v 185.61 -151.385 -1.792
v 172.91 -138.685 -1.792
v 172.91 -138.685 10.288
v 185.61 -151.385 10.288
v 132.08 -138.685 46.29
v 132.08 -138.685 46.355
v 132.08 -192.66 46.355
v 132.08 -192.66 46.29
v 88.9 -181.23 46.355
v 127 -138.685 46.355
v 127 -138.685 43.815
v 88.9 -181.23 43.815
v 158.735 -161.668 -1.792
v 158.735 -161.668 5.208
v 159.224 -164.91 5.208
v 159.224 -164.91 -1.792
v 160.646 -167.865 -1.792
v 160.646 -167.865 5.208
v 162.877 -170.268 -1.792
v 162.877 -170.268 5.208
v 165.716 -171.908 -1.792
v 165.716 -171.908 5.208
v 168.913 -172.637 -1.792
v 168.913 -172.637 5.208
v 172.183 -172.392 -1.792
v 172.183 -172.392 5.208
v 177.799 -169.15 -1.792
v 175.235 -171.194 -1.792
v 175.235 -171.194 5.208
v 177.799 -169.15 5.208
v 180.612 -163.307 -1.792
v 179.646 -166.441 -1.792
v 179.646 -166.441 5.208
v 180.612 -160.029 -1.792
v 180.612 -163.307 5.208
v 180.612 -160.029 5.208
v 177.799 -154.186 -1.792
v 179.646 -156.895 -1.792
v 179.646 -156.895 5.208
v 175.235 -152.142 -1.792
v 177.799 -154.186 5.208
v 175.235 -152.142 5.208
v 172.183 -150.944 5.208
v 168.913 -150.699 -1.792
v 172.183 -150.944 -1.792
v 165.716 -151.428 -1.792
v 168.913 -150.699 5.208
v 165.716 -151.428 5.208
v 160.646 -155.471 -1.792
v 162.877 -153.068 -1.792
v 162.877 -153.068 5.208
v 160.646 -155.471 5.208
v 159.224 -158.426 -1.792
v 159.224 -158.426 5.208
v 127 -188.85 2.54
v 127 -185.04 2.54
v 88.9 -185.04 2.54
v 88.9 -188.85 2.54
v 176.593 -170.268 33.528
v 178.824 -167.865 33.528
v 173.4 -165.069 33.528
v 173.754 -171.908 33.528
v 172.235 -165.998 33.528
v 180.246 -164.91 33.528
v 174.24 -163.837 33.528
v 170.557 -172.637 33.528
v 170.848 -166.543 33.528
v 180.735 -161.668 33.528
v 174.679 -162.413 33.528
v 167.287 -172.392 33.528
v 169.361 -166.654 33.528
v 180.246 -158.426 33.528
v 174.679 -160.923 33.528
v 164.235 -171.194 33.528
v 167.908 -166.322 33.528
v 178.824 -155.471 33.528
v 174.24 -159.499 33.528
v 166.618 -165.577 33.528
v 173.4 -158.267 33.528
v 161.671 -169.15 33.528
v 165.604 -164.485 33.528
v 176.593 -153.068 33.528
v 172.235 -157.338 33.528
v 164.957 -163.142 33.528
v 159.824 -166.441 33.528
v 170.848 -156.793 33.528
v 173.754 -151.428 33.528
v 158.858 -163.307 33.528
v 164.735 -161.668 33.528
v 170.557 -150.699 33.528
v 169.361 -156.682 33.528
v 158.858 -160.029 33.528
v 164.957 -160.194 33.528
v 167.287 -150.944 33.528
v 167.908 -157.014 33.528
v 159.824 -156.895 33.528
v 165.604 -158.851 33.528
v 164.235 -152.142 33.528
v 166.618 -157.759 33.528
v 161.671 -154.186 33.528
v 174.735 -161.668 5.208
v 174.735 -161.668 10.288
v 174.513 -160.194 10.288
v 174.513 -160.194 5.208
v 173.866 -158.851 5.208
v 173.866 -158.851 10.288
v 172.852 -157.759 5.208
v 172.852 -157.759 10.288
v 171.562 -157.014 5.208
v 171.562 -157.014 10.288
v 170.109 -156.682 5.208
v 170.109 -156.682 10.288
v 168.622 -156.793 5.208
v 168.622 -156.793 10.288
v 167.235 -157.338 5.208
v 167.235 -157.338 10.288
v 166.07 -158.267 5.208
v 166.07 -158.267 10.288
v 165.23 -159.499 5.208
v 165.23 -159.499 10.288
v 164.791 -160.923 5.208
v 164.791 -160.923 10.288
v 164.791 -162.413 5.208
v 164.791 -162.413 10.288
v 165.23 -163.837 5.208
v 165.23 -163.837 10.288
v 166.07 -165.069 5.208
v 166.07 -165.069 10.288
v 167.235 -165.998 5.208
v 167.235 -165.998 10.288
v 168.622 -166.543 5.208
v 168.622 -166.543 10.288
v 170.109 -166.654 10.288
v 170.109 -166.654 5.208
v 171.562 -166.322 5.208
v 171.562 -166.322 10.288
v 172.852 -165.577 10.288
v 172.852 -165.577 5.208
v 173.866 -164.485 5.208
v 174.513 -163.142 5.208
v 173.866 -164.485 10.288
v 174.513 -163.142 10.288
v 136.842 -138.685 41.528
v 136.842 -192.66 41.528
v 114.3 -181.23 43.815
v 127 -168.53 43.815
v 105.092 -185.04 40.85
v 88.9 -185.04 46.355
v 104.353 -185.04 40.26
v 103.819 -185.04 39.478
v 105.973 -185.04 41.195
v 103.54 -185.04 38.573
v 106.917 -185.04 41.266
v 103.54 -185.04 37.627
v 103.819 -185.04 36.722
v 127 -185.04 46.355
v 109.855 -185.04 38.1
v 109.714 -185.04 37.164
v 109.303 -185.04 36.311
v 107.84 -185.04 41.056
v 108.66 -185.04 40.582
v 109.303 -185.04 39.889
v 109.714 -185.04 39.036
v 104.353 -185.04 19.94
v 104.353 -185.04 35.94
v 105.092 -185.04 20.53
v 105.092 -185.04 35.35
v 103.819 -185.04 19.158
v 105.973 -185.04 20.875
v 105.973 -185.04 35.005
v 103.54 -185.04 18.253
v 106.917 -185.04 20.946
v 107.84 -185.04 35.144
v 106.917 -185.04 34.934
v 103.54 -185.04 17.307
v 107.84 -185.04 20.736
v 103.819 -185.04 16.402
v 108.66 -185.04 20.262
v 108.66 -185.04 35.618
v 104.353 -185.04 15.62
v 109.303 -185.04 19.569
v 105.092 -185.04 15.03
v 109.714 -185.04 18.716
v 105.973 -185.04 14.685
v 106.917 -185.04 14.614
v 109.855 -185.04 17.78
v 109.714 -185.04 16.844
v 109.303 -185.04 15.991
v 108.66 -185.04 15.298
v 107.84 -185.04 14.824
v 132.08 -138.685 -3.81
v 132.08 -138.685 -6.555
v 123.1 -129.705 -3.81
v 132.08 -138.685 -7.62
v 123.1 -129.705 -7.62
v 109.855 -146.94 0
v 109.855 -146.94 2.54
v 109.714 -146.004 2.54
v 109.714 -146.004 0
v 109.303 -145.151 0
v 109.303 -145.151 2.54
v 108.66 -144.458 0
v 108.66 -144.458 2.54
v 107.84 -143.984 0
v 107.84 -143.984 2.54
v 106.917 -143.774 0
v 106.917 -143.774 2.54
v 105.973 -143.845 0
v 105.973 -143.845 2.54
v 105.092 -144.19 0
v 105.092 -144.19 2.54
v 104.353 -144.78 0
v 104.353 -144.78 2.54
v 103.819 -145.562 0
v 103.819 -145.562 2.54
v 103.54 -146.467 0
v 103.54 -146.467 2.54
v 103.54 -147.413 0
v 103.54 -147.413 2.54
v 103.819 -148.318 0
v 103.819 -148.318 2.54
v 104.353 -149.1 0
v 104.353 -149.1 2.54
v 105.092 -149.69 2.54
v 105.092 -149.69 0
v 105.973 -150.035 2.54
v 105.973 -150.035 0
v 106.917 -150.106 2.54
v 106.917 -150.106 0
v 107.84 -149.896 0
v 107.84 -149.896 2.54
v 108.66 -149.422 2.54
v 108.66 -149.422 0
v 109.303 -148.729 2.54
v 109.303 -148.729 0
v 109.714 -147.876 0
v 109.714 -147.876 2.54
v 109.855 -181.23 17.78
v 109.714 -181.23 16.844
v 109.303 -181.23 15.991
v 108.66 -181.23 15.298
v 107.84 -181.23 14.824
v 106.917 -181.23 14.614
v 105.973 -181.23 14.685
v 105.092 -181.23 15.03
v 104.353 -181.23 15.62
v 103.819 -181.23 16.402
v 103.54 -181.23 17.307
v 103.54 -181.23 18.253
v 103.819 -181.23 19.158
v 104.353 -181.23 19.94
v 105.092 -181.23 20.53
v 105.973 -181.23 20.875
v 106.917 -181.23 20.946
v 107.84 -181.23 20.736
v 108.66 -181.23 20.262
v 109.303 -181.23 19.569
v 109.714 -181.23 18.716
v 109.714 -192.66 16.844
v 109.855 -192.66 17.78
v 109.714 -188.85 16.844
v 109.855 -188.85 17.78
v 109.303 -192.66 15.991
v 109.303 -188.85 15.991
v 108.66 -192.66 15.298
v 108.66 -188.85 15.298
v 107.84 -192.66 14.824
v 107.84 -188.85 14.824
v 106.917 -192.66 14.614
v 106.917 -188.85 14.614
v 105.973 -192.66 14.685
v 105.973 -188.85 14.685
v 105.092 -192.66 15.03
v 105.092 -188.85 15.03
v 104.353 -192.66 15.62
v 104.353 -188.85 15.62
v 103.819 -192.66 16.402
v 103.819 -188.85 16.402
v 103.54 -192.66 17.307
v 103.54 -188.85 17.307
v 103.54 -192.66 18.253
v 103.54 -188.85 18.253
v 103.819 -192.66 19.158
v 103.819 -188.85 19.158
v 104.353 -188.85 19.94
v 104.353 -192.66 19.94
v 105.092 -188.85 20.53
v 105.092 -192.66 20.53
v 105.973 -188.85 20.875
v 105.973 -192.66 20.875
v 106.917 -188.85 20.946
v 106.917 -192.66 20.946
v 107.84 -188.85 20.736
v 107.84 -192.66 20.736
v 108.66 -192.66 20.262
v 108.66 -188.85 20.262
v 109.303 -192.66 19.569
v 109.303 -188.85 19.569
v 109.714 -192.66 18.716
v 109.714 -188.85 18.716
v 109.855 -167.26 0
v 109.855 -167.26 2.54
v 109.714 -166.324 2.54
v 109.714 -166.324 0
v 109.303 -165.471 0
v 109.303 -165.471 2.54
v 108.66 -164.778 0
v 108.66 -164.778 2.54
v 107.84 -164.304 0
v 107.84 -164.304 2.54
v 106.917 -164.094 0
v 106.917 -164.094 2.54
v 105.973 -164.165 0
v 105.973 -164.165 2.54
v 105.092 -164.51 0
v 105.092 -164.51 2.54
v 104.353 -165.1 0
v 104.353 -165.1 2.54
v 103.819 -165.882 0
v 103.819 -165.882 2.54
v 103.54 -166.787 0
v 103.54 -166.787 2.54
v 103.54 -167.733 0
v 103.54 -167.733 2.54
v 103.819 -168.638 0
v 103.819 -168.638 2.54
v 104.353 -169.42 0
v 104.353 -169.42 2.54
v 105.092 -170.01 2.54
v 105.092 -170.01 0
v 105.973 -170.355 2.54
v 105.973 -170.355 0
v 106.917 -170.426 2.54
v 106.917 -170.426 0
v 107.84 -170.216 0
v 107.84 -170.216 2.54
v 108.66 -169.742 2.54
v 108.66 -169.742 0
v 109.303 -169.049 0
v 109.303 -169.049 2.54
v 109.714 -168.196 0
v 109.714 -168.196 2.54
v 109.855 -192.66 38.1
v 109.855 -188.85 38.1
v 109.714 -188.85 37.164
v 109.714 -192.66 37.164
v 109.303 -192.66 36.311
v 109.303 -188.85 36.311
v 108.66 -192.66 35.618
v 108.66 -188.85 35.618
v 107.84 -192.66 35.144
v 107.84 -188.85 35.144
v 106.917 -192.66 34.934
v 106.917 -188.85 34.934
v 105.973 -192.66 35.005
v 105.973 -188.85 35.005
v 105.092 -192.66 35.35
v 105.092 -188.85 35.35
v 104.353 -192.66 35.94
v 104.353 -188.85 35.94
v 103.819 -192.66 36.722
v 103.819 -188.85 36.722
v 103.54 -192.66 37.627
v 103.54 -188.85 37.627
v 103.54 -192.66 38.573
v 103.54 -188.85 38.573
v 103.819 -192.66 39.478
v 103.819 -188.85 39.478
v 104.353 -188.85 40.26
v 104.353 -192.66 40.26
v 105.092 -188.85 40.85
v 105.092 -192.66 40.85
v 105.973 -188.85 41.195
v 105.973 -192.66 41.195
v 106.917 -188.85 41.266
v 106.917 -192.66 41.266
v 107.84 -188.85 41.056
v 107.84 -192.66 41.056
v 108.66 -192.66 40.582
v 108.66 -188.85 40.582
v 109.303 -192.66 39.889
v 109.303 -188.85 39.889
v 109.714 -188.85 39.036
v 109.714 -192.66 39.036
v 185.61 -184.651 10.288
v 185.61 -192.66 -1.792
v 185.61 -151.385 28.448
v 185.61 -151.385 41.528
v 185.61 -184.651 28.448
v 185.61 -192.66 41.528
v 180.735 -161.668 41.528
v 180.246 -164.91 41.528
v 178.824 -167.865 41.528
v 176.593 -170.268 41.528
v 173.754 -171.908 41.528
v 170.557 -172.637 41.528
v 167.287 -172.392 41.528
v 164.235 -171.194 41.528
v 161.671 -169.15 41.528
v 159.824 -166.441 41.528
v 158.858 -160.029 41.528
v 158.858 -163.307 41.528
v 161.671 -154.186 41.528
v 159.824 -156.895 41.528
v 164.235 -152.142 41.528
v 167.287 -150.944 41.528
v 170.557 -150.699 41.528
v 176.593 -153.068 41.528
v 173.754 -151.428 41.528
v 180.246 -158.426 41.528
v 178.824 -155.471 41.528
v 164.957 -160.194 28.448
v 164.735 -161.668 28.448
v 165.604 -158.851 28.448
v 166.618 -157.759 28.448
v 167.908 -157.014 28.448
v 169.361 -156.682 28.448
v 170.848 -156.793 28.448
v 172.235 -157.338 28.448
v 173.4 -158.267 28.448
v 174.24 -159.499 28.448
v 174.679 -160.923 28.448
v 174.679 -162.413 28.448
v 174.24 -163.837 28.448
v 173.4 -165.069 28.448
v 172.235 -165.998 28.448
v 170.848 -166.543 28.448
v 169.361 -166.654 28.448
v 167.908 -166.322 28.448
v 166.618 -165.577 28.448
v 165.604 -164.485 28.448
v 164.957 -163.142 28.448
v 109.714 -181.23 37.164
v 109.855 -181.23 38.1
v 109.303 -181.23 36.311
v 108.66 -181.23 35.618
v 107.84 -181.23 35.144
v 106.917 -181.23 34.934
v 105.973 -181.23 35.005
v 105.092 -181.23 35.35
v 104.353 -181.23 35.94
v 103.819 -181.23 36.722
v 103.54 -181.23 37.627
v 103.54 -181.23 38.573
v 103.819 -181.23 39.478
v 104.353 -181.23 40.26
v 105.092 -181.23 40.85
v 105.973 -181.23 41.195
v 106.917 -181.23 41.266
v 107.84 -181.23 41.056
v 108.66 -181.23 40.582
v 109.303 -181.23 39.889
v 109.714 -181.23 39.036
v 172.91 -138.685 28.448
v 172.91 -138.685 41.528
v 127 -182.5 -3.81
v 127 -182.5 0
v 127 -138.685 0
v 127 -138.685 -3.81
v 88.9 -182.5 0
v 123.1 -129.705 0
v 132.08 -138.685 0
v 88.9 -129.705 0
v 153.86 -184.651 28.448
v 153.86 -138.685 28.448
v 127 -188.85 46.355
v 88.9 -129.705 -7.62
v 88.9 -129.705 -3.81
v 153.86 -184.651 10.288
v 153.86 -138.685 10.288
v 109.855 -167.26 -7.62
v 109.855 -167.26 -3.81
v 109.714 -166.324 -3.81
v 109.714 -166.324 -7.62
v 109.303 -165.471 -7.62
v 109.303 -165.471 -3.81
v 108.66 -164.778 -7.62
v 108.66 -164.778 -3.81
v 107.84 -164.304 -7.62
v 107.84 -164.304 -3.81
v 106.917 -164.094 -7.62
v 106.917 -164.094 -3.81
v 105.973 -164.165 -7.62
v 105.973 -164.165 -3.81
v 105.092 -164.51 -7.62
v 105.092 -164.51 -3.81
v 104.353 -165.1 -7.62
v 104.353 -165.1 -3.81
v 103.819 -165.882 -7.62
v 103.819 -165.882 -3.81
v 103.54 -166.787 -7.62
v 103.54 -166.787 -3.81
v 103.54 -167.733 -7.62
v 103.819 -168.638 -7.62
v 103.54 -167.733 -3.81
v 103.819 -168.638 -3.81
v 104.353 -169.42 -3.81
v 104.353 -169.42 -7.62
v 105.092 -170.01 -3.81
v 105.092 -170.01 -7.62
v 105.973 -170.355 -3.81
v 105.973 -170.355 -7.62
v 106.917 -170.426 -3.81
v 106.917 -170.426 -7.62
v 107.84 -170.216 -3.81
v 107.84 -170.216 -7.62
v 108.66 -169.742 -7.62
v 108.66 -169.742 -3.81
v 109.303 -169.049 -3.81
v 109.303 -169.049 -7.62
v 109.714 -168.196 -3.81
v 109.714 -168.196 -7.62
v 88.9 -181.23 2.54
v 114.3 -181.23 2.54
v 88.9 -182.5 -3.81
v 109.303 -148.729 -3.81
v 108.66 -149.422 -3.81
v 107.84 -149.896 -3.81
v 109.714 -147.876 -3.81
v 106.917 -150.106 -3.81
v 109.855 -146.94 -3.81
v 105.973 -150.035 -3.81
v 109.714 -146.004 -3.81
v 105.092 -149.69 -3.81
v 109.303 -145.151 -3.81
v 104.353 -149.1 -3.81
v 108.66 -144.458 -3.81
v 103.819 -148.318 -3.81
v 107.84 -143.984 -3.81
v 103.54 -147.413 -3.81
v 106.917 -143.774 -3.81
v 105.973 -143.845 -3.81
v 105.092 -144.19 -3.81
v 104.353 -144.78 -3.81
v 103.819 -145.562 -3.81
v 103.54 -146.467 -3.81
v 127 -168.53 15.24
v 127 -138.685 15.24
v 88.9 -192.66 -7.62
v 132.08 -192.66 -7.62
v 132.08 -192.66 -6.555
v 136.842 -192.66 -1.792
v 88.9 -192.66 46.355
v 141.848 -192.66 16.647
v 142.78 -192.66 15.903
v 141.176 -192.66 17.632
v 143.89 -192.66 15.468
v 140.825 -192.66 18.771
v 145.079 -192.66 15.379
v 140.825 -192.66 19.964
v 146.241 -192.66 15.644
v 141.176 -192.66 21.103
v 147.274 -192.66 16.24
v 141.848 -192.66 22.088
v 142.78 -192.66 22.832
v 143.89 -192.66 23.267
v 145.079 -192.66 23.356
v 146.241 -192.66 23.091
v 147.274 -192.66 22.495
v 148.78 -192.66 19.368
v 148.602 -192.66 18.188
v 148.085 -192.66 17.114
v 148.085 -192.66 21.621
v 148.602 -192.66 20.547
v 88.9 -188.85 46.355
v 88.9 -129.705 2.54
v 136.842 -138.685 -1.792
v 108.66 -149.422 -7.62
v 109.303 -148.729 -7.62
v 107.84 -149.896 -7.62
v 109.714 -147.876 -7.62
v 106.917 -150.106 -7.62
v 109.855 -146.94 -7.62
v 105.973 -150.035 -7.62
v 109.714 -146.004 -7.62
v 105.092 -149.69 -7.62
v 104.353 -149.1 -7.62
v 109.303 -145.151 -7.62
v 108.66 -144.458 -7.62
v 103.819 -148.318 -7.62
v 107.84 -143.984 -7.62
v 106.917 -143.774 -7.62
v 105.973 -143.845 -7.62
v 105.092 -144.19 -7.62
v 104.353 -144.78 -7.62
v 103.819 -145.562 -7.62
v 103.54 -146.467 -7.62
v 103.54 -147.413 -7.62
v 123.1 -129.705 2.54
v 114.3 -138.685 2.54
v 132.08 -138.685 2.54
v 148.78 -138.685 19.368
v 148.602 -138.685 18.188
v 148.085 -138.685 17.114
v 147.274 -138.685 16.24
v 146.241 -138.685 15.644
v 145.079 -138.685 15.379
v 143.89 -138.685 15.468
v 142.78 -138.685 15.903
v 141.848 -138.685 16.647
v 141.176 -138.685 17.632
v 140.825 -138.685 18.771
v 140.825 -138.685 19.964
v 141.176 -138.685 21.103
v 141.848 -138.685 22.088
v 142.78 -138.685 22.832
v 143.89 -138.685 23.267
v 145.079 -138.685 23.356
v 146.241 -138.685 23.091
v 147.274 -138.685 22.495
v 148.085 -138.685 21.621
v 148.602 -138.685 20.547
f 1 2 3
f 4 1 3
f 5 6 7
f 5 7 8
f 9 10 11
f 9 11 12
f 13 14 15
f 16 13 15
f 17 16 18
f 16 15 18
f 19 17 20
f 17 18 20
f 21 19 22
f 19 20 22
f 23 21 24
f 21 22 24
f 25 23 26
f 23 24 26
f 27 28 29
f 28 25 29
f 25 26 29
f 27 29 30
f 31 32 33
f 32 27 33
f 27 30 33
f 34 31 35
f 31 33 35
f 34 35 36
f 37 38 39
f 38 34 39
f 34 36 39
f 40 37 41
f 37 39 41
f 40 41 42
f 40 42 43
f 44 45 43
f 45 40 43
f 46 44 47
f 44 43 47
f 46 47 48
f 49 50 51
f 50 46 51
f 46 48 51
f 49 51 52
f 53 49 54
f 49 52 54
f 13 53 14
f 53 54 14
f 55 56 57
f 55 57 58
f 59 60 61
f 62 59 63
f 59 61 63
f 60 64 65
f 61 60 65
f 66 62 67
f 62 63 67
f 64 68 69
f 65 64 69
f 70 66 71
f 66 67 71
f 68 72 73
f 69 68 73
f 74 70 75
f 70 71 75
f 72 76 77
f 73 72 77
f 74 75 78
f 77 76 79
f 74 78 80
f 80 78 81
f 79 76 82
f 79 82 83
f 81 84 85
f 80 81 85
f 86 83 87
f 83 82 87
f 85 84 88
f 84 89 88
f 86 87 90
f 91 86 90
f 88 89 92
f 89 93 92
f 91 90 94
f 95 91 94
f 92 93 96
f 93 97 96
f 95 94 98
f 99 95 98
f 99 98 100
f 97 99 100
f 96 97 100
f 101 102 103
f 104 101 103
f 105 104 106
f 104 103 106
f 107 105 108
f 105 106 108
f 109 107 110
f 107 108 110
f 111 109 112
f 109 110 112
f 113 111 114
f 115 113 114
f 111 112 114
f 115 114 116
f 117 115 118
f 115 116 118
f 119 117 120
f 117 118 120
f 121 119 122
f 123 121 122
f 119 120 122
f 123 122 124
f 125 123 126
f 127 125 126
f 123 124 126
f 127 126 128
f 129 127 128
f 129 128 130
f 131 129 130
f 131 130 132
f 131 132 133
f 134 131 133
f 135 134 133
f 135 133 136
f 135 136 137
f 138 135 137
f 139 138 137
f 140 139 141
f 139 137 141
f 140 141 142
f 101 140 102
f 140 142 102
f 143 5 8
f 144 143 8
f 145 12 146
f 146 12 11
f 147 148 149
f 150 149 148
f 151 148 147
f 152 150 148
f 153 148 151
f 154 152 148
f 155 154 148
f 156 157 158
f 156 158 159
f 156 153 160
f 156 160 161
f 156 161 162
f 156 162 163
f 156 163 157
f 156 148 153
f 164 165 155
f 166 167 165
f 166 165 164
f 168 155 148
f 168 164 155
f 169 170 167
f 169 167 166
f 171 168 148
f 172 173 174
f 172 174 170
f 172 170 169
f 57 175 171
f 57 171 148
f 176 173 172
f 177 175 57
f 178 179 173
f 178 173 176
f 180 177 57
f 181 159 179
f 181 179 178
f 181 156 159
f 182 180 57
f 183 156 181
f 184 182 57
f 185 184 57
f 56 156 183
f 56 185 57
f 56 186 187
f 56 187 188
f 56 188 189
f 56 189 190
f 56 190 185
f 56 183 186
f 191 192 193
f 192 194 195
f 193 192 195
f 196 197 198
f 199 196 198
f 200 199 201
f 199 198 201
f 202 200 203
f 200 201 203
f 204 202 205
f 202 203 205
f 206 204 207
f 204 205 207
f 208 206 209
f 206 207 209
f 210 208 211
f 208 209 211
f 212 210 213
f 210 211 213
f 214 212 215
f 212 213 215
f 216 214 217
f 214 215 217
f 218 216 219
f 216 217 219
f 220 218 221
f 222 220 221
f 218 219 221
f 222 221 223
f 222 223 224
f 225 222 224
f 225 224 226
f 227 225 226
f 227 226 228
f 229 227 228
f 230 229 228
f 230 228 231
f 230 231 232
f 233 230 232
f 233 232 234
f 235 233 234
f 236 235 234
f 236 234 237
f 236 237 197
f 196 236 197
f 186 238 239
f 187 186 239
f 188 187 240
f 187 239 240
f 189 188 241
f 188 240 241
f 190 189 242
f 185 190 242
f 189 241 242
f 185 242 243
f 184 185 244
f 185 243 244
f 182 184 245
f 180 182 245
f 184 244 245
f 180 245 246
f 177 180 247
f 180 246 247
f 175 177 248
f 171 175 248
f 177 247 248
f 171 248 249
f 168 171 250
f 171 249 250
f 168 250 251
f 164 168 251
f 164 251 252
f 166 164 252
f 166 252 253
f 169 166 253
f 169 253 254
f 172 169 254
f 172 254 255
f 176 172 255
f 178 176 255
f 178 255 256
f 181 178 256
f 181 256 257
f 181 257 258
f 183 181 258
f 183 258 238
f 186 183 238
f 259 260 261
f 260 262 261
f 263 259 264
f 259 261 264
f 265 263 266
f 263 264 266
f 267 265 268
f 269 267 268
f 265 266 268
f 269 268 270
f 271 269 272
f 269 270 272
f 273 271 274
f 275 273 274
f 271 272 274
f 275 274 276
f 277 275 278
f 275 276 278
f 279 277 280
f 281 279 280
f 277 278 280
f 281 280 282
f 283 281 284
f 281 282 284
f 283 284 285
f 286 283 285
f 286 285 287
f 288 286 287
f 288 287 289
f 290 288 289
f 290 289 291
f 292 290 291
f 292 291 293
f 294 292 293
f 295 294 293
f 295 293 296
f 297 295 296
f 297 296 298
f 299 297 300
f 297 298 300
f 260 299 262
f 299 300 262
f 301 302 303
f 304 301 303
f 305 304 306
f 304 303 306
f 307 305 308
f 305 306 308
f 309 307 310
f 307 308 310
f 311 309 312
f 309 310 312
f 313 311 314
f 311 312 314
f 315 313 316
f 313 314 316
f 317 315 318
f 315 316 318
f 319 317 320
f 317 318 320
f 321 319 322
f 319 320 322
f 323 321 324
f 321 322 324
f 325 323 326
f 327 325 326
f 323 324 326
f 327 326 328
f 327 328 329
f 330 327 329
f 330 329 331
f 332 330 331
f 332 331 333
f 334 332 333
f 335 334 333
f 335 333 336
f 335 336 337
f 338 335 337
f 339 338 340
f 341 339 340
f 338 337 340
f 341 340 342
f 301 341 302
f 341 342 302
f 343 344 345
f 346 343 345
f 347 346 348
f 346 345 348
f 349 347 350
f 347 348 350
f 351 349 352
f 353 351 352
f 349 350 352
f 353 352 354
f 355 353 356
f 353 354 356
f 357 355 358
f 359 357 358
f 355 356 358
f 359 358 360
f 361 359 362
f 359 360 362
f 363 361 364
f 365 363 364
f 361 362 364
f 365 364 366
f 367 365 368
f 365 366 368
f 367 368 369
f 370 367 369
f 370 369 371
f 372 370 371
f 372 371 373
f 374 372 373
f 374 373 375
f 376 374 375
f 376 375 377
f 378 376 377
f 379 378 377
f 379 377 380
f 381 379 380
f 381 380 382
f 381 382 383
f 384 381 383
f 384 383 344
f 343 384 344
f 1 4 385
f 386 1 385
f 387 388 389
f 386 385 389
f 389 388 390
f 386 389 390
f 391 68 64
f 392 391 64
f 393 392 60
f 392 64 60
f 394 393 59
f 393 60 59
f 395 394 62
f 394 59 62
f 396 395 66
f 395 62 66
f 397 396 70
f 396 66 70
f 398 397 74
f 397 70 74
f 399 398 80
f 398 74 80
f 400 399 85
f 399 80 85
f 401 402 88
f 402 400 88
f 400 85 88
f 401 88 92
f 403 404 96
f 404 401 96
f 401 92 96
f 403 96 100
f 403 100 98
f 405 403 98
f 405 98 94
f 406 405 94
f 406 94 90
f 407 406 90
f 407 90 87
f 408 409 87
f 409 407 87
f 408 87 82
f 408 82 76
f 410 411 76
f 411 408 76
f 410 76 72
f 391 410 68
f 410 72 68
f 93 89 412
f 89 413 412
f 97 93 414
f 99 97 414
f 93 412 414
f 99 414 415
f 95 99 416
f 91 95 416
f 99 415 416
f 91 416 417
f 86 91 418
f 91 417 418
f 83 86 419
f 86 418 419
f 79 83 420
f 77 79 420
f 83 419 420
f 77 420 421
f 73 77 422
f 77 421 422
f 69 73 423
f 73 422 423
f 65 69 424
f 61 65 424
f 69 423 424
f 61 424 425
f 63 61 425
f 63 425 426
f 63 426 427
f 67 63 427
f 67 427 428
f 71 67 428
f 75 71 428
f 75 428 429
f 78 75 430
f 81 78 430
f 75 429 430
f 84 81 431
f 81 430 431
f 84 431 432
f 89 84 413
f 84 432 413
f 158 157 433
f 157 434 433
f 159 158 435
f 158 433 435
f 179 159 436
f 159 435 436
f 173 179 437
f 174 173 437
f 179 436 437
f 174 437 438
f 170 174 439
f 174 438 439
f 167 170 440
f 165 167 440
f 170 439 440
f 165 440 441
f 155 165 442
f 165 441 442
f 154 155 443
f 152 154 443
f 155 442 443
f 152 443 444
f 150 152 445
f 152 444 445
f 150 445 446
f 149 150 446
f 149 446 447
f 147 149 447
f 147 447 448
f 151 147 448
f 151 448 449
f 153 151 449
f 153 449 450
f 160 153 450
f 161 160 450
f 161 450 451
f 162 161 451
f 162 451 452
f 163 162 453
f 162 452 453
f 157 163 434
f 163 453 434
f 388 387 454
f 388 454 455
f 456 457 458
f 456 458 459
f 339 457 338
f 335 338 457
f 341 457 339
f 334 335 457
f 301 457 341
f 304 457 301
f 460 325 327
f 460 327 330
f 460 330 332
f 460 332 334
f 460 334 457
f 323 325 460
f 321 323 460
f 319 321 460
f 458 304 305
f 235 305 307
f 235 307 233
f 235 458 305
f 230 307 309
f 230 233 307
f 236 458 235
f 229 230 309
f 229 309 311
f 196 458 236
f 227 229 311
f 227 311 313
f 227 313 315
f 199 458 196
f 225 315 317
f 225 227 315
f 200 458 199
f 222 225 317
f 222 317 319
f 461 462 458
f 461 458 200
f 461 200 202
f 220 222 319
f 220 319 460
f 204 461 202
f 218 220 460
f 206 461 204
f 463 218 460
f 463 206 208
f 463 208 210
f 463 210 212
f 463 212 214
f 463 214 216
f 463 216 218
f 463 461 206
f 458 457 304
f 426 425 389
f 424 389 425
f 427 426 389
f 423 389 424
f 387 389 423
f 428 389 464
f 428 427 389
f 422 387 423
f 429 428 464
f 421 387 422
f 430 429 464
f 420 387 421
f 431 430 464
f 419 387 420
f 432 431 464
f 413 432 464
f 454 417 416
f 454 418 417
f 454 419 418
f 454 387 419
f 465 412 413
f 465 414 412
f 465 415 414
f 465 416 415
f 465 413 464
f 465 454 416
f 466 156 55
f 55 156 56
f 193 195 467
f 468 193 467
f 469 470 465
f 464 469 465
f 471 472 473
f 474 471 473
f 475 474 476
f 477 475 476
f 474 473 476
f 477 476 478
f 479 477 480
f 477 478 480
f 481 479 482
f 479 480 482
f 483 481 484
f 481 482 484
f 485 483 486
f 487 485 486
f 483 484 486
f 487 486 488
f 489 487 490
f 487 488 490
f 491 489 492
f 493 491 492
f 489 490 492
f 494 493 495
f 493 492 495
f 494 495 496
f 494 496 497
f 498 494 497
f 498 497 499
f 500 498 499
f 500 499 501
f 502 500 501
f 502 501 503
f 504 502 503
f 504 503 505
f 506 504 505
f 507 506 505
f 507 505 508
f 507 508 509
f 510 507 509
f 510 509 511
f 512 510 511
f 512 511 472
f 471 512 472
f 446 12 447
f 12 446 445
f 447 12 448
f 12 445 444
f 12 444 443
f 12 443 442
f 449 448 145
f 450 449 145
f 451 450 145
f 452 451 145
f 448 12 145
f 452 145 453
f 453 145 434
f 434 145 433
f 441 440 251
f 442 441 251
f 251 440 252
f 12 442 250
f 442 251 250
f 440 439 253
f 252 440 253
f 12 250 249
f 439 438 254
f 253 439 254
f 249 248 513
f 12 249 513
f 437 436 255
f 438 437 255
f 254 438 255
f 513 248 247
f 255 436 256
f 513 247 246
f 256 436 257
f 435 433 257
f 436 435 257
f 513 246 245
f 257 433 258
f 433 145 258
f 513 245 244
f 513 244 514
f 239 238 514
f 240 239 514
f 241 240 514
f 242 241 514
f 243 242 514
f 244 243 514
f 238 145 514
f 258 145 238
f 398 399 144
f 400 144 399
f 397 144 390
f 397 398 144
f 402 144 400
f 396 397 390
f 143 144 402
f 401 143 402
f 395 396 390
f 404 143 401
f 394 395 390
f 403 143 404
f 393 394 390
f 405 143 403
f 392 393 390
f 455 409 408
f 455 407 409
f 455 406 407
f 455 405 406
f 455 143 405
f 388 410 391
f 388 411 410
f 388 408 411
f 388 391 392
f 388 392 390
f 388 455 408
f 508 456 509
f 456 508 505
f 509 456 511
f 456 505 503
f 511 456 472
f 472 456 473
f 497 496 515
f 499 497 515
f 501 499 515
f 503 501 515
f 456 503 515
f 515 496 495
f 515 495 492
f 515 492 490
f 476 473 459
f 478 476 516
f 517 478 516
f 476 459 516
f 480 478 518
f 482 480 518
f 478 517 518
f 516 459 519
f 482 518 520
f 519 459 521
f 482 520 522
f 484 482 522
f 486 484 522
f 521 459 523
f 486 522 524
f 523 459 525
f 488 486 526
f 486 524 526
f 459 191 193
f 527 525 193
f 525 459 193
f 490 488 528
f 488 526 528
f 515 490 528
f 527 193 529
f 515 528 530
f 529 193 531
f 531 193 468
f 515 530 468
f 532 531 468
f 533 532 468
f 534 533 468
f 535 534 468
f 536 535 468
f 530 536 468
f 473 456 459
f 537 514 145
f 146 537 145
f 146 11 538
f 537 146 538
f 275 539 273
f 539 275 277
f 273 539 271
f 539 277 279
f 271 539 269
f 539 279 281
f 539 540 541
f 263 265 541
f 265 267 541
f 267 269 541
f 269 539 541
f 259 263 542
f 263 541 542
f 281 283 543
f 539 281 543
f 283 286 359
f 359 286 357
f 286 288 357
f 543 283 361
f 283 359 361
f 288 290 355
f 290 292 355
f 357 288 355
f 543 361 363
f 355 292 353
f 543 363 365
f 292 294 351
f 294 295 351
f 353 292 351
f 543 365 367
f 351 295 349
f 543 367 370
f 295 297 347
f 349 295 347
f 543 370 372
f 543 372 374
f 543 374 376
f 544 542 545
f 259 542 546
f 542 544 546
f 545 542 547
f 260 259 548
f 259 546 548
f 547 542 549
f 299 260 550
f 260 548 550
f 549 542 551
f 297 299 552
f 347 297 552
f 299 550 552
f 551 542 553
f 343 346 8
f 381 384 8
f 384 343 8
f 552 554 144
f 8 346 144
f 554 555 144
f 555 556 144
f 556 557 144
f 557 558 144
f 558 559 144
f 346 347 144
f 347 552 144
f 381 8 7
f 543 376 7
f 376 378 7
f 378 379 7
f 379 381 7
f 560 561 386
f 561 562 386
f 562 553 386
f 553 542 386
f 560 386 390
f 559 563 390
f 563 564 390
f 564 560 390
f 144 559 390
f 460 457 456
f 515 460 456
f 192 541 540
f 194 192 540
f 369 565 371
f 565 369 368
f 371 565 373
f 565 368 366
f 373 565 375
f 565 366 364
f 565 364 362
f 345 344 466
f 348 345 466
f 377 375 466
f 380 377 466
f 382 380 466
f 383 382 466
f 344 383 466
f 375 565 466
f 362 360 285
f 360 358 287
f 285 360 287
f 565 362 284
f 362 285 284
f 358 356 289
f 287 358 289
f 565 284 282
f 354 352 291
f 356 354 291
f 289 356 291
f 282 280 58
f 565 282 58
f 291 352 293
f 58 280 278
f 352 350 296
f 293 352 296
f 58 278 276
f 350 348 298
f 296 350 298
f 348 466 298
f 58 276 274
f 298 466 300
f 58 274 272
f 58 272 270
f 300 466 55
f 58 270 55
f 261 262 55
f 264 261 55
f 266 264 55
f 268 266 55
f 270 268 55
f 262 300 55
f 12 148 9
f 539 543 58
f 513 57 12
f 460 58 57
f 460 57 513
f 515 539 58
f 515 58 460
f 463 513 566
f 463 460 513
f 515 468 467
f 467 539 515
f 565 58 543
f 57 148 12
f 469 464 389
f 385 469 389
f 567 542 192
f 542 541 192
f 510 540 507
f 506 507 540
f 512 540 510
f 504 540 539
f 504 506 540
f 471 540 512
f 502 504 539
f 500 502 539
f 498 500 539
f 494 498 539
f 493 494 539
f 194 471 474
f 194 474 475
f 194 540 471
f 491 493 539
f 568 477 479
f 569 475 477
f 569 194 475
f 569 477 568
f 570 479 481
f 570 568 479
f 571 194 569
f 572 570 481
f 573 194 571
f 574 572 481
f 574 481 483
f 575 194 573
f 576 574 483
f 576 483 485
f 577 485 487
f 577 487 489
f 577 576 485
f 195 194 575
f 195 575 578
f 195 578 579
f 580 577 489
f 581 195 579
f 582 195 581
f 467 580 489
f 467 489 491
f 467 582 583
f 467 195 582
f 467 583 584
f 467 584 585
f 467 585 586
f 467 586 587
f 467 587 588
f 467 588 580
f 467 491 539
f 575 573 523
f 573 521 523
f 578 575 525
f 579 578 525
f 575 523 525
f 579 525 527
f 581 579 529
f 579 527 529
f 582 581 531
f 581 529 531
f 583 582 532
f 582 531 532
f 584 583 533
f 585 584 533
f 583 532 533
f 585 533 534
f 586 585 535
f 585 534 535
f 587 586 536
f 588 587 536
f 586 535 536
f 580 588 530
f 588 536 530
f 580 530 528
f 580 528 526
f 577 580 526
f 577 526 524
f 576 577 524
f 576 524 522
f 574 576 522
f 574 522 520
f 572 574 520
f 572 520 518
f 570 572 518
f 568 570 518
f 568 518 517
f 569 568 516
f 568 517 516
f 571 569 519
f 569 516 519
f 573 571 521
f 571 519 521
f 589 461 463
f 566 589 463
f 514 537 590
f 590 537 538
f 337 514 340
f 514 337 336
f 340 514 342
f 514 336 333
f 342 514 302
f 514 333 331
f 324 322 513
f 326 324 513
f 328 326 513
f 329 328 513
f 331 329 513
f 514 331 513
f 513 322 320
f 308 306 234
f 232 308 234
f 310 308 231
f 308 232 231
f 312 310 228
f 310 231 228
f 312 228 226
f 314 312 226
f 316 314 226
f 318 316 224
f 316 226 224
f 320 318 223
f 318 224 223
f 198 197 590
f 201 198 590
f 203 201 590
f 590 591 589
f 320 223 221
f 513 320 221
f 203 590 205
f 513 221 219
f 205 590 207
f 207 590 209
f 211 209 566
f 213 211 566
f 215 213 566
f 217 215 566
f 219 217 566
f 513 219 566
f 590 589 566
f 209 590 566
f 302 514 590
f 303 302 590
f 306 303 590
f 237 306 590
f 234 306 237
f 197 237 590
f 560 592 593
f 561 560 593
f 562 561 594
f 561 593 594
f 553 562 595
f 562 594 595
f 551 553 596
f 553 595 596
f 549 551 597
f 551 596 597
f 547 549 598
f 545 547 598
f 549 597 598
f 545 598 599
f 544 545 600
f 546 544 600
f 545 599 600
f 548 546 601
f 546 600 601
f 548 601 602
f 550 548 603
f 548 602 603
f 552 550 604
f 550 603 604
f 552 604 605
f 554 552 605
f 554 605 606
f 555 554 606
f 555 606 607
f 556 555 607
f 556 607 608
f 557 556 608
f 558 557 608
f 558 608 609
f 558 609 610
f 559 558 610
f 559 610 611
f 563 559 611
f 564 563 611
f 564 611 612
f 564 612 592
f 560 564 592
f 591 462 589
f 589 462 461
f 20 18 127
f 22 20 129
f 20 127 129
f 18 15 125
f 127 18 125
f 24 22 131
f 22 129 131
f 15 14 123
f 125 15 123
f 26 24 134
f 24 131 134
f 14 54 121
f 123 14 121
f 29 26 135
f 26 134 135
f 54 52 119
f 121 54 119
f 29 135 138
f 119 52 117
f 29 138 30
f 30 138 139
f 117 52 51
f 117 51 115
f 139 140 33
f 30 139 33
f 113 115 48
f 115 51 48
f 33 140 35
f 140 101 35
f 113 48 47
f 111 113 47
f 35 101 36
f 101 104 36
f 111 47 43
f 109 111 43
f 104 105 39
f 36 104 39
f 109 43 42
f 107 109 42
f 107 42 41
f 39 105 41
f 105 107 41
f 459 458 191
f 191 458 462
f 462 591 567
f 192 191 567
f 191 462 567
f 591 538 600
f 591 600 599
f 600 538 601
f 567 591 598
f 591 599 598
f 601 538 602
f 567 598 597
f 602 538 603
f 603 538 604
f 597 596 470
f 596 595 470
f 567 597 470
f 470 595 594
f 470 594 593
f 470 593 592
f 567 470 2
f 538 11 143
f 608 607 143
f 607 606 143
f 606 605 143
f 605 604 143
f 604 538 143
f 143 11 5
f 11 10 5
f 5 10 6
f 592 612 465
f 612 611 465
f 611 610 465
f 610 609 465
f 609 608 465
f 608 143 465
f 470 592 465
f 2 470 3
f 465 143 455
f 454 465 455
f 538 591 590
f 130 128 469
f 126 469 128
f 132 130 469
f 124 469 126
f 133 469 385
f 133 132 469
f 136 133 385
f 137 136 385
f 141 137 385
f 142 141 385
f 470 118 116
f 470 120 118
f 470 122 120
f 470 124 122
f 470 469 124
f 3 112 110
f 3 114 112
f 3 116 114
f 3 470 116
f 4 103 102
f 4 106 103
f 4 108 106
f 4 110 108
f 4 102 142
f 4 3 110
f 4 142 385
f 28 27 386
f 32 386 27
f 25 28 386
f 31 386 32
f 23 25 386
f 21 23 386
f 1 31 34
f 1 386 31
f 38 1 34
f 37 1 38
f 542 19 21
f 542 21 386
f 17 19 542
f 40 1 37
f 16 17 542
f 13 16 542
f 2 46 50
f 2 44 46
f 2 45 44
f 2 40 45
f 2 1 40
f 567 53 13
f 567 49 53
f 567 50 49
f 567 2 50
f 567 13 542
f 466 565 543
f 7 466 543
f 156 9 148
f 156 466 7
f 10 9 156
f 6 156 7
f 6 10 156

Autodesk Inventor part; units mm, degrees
ref_plane "YZ Plane" through (0, 0, 0) normal (1, 0, 0) x (0, 1, 0)
ref_plane "XZ Plane" through (0, 0, 0) normal (0, 1, 0) x (-1, 0, 0)
ref_plane "Work Plane1" through (0, 0, 0) normal (0, 0, 1) x (1, 0, 0)
ref_plane "Work Plane2" through (127, 182.5, 0) normal (1, 0, 0) x (0, 1, 0)
sketch "Sketch1" plane through (127, 182.5, 0) normal (1, 0, 0) x (0, 1, 0)
  line L0 (0, -3.81) -> (-365, -3.81) projected
  line L1 (0, 0) -> (0, -3.81) projected
  line L2 (0, 0) -> (-365, 0) projected
  line L3 (-365, 0) -> (-365, -3.81) projected
  line L4 (-371.35, 459.74) -> (-371.35, 2.54) projected
  line L5 (-367.54, 2.54) -> (-371.35, 2.54) projected
  line L6 (-367.54, 459.74) -> (-367.54, 2.54) projected
  line L7 (-367.54, 459.74) -> (-371.35, 459.74) projected
  line L8 (-367.54, 46.355) -> (-363.73, 46.355)
  line L9 (-321.185, -3.81) -> (-321.185, -7.62)
  line L10 (-321.185, -7.62) -> (-375.16, -7.62)
  line L11 (-375.16, -7.62) -> (-375.16, 46.355)
  line L12 (-363.73, 46.355) -> (-363.73, 2.54)
  line L13 (-363.73, 2.54) -> (-321.185, 2.54)
  line L14 (-321.185, 2.54) -> (-321.185, 0)
  line L15 (-321.185, 0) -> (-365, 0)
  line L16 (-365, 0) -> (-365, -3.81)
  line L17 (-365, -3.81) -> (-321.185, -3.81)
  line L18 (-371.35, 46.355) -> (-371.35, 41.275)
  line L19 (-371.35, 41.275) -> (-371.35, 2.54)
  line L20 (-371.35, 2.54) -> (-367.54, 2.54)
  line L21 (-367.54, 2.54) -> (-367.54, 46.355)
  line L22 (-375.16, 46.355) -> (-371.35, 46.355)
  line L23 (-367.54, 46.355) -> (-363.73, 46.355)
  point P0 (-182.5, 0)
  point P1 (-326.265, 0)
  point P2 (-326.265, -3.81)
  point P3 (-367.54, 41.275)
  dimension "d2" = 3.81
  dimension "d4" = 3.81
extrude "Extrusion1" add sketch "Sketch1" against normal blind 38.1 contours L9 L10 L11 L22 L4 L5 L6 L8 L12 L13 L14 L2 L3 L0
sketch "Sketch2" plane through (127, 182.5, 0) normal (1, 0, 0) x (0, 0, -1)
  line L0 (3.81, -365) -> (0, -365) projected
  line L1 (0, -365) -> (0, -321.185) projected
  line L2 (0, -321.185) -> (-2.54, -321.185) projected
  line L3 (-2.54, -321.185) -> (-2.54, -363.73) projected
  line L4 (-2.54, -363.73) -> (-46.355, -363.73) projected
  line L5 (-46.355, -363.73) -> (-46.355, -367.54) projected
  line L6 (-46.355, -367.54) -> (-2.54, -367.54) projected
  line L7 (-2.54, -367.54) -> (-2.54, -371.35) projected
  line L8 (-2.54, -371.35) -> (-46.355, -371.35) projected
  line L9 (-46.355, -371.35) -> (-46.355, -375.16) projected
  line L10 (-46.355, -375.16) -> (7.62, -375.16) projected
  line L11 (7.62, -375.16) -> (7.62, -321.185) projected
  line L12 (7.62, -321.185) -> (3.81, -321.185) projected
  line L13 (3.81, -321.185) -> (3.81, -365) projected
  line L14 (3.81, -321.185) -> (7.62, -321.185) projected
  line L15 (7.62, -375.16) -> (-46.355, -375.16) projected
  line L16 (7.62, -321.185) -> (-46.355, -321.185)
  line L17 (-46.355, -321.185) -> (-46.355, -375.16)
  line L18 (-46.355, -375.16) -> (7.62, -375.16)
  line L19 (7.62, -375.16) -> (7.62, -321.185)
  point P0 (0, -182.5)
extrude "Extrusion2" add sketch "Sketch2" along normal blind 5.08
sketch "Sketch3" plane through (88.9, -138.685, -3.81) normal (0, 1, 0) x (1, 0, 0)
  line L0 (38.1, -3.81) -> (0, -3.81) projected
  line L1 (0, -6.35) -> (0, -3.81) projected
  line L2 (38.1, -6.35) -> (0, -6.35) projected
  line L3 (38.1, -6.35) -> (38.1, -50.165) projected
  line L4 (38.1, -50.165) -> (43.18, -50.165) projected
  line L5 (43.18, 3.81) -> (43.18, -50.165) projected
  line L6 (0, 3.81) -> (43.18, 3.81) projected
  line L7 (0, 0) -> (0, 3.81) projected
  line L8 (38.1, 0) -> (0, 0) projected
  line L9 (38.1, 0) -> (38.1, -3.81) projected
  line L10 (43.18, -50.165) -> (43.18, 3.81) projected
  line L11 (43.18, -23.1775) -> (55.88, -23.1775)
  circle A0 centre (55.88, -23.1775) radius 4
  line L12 (55.88, -27.1775) -> (55.88, -32.2575)
  line L13 (55.88, -19.1775) -> (55.88, -14.0975)
  line L14 (59.88, -23.1775) -> (64.96, -23.1775)
  line L15 (43.18, -14.0975) -> (64.96, -14.0975)
  line L16 (64.96, -14.0975) -> (64.96, -32.2575)
  line L17 (64.96, -32.2575) -> (43.18, -32.2575)
  line L18 (43.18, -32.2575) -> (43.18, -14.0975)
  point P0 (-88.9, -3.81)
  dimension "d9" = 12.7
  dimension "d10" = 8
  dimension "d11" = 5.08
  dimension "d12" = 5.08
  dimension "d13" = 5.08
extrude "Extrusion3" add sketch "Sketch3" against normal up to surface (53.975 mm away) contours L15 L13 A0 L11 L5 | L5 L11 A0 L12 L17 | L15 L16 L14 A0 L13 | L12 A0 L14 L16 L17
sketch "Sketch4" plane through (132.08, -138.685, 28.4475) normal (0, 0, 1) x (1, 0, 0)
  line L0 (0, -53.975) -> (21.78, -53.975) projected
  line L1 (21.78, 0) -> (21.78, -53.975) projected
  line L2 (0, 0) -> (21.78, 0) projected
  line L3 (0, -53.975) -> (0, 0) projected
  line L4 (0, -53.975) -> (0, 0) projected
  line L5 (21.78, 0) -> (21.78, -53.975) projected
  line L6 (0, -45.966) -> (21.78, -45.966)
  line L7 (21.78, -45.966) -> (21.78, -26.916)
  line L8 (21.78, -26.916) -> (0, -26.916)
  line L9 (0, -26.916) -> (0, -45.966)
  line L10 (21.78, -45.966) -> (53.53, -45.966)
  line L11 (53.53, -45.966) -> (53.53, 0)
  line L12 (53.53, 0) -> (21.78, 0)
  line L13 (21.78, 0) -> (21.78, -45.966)
  circle A0 centre (37.655, -22.983) radius 11
  point P0 (-132.08, 138.685)
  dimension "d16" = 19.05
  dimension "d17" = 31.75
  dimension "d18" = 22
extrude "Extrusion4" add sketch "Sketch4" along normal blind 5.08 contours L3 L8 L1 L6 | L1 L12 L11 L10 | L3 L2 L1 L8
sketch "Sketch5" plane through (153.86, -138.685, 10.2875) normal (0, 0, -1) x (-1, 0, 0)
  circle A0 centre (-15.875, -22.983) radius 11 projected
  line L0 (21.78, -45.966) -> (-31.75, -45.966) projected
  line L1 (-31.75, -45.966) -> (-31.75, 0) projected
  line L2 (-31.75, 0) -> (21.78, 0) projected
  line L3 (21.78, -45.966) -> (21.78, 0) projected
  point P0 (153.86, 138.685)
extrude "Extrusion5" add sketch "Sketch5" along normal blind 5.08
sketch "Sketch6" plane through (132.08, -138.685, 33.5275) normal (0, 0, 1) x (1, 0, 0)
  circle A0 centre (37.655, -22.983) radius 11 projected
  line L0 (0, -45.966) -> (53.53, -45.966) projected
  line L1 (53.53, -45.966) -> (53.53, 0) projected
  line L2 (53.53, 0) -> (0, 0) projected
  line L3 (0, -45.966) -> (0, 0) projected
  point P0 (-132.08, 138.685)
extrude "Extrusion6" add sketch "Sketch6" along normal blind 8
sketch "Sketch7" plane through (132.08, -138.685, 28.4475) normal (0, 0, -1) x (-1, 0, 0)
  line L0 (-53.53, -45.966) -> (-53.53, 0) projected
  circle A0 centre (-37.655, -22.983) radius 11 projected
  line L1 (0, -45.966) -> (-53.53, -45.966) projected
  line L2 (-53.53, -45.966) -> (-53.53, 0) projected
  line L3 (-53.53, 0) -> (0, 0) projected
  line L4 (0, -45.966) -> (0, 0) projected
  circle A1 centre (-37.655, -22.983) radius 5
  point P0 (132.08, 138.685)
  dimension "d25" = 10
extrude "Extrusion7" add sketch "Sketch7" against normal blind 5.08 contours A0
chamfer "Chamfer1" distance 4.7625 angle 45 1 edges at (132.08, -161.668, 41.5275)
sketch "Sketch8" plane through (153.86, -138.685, 10.2875) normal (0, 0, 1) x (1, 0, 0)
  circle A0 centre (15.875, -22.983) radius 5 projected
  circle A1 centre (15.875, -22.983) radius 11 projected
  point P0 (-153.86, 138.685)
extrude "Extrusion8" add sketch "Sketch8" against normal blind 5.08
sketch "Sketch9" plane through (153.86, -138.685, 5.2075) normal (0, 0, -1) x (-1, 0, 0)
  circle A0 centre (-15.875, -22.983) radius 5 projected
  line L0 (-31.75, -45.966) -> (21.78, -45.966) projected
  line L1 (21.78, 0) -> (21.78, -45.966) projected
  line L2 (21.78, 0) -> (-31.75, 0) projected
  line L3 (-31.75, 0) -> (-31.75, -45.966) projected
  circle A1 centre (-15.875, -22.983) radius 11 projected
  point P0 (153.86, 138.685)
extrude "Extrusion9" add sketch "Sketch9" along normal blind 7 contours L3 L2 L1 L0
chamfer "Chamfer2" distance 4.7625 angle 45 1 edges at (132.08, -161.668, -1.7925)
sketch "Sketch10" plane through (153.86, -184.651, 28.4475) normal (0, -1, 0) x (1, 0, 0)
  line L0 (4.875, -23.24) -> (26.875, -23.24) projected
  line L1 (-21.78, -18.16) -> (0, -18.16) projected
  line L2 (-21.78, -35.0025) -> (-21.78, -18.16) projected
  line L3 (-17.0175, -30.24) -> (-21.78, -35.0025) projected
  line L4 (31.75, -30.24) -> (-17.0175, -30.24) projected
  line L5 (31.75, -18.16) -> (31.75, -30.24) projected
  line L6 (0, -18.16) -> (31.75, -18.16) projected
  line L7 (4.875, 5.08) -> (26.875, 5.08) projected
  line L8 (0, 0) -> (-21.78, 0) projected
  line L9 (0, 0) -> (31.75, 0) projected
  line L10 (31.75, 0) -> (31.75, 13.08) projected
  line L11 (-17.0175, 13.08) -> (31.75, 13.08) projected
  line L12 (-21.78, 17.8425) -> (-17.0175, 13.08) projected
  line L13 (-21.78, 0) -> (-21.78, 17.8425) projected
  line L14 (0, 0) -> (31.75, 0) projected
  line L15 (31.75, -30.24) -> (0, -30.24)
  line L16 (0, -30.24) -> (0, 0)
  line L17 (0, 0) -> (31.75, 0)
  line L18 (31.75, 0) -> (31.75, -30.24)
  point P0 (-153.86, -28.4475)
extrude "Extrusion10" add sketch "Sketch10" along normal up to surface (8.009 mm away)
sketch "Sketch11" plane through (88.9, -185.04, 46.355) normal (0, 0, 1) x (1, 0, 0)
  line L0 (38.1, 3.81) -> (0, 3.81) projected
  line L1 (0, 0) -> (0, 3.81) projected
  line L2 (38.1, 0) -> (0, 0) projected
  line L3 (38.1, 0) -> (38.1, -3.81) projected
  line L4 (38.1, -3.81) -> (0, -3.81) projected
  line L5 (0, -7.62) -> (0, -3.81) projected
  line L6 (0, -7.62) -> (43.18, -7.62) projected
  line L7 (43.18, 46.355) -> (43.18, -7.62) projected
  line L8 (38.1, 46.355) -> (43.18, 46.355) projected
  line L9 (38.1, 46.355) -> (38.1, 3.81) projected
  line L10 (0, 0) -> (0, 3.81) projected
  line L11 (38.1, 46.355) -> (0, 3.81)
  line L12 (38.1, 3.81) -> (0, 3.81) projected
  line L13 (0, 3.81) -> (38.1, 3.81)
  line L14 (38.1, 3.81) -> (38.1, 46.355)
  point P0 (-88.9, 185.04)
extrude "Extrusion11" add sketch "Sketch11" against normal blind 2.54 contours L0 L11 L9
sketch "Sketch12" plane through (88.9, -181.23, 2.54) normal (0, 0, 1) x (1, 0, 0)
  circle A0 centre (17.78, 13.97) radius 3.175 projected
  circle A1 centre (17.78, 34.29) radius 3.175 projected
  circle A2 centre (17.78, 13.97) radius 3.175 projected
  point P0 (-88.9, 181.23)
extrude "Extrusion12" cut sketch "Sketch12" against normal blind 45.4025
sketch "Sketch13" plane through (88.9, -181.23, 2.54) normal (0, 1, 0) x (1, 0, 0)
  circle A0 centre (17.78, -15.24) radius 3.175 projected
  circle A1 centre (17.78, -35.56) radius 3.175 projected
  point P0 (-88.9, 2.54)
extrude "Extrusion13" cut sketch "Sketch13" along normal mid plane 45.4025
chamfer "Chamfer3" distance 12.7 angle 45 2 edges at (127, -159.9575, 2.54) (127, -181.23, 23.1775)
chamfer "Chamfer4" distance 12.7 angle 45 2 edges at (185.61, -138.685, 4.2475) (185.61, -138.685, 34.9875)
sketch "Sketch14" plane through (88.9, -192.66, -7.62) normal (0, 0, -1) x (-1, 0, 0)
  circle A0 centre (-17.78, 25.4) radius 3.175 projected
  circle A1 centre (-17.78, 45.72) radius 3.175 projected
  line L0 (0, 0) -> (-43.18, 0) projected
  line L1 (0, 53.975) -> (0, 0) projected
  line L2 (0, 53.975) -> (-43.18, 53.975) projected
  line L3 (-43.18, 0) -> (-43.18, 53.975) projected
  line L4 (-43.18, 53.975) -> (-34.1997, 62.9553)
  line L5 (-43.18, 53.975) -> (-30.48, 53.975) construction
  line L6 (-34.1997, 62.9553) -> (0, 62.9553)
  line L7 (-25.4, 53.975) -> (0, 53.975) projected
  line L8 (0, 62.9553) -> (0, 53.975)
  line L9 (-47.9425, 53.975) -> (-43.18, 53.975) projected
  line L10 (-43.18, 53.975) -> (0, 53.975)
  point P0 (88.9, 192.66)
  dimension "d52" = 12.7
  dimension "d53" = 45
ref_plane "Work Plane3" through (-127, -182.5, -3.81) normal (0, 0, -1) x (0, 1, 0)
extrude "Extrusion14" add sketch "Sketch14" against normal up to surface (3.81 mm away) contours L2 L4 L6 L8
sketch "Sketch15" plane through (88.9, -182.5, 0) normal (0, 0, -1) x (-1, 0, 0)
  line L0 (-43.18, 43.815) -> (-34.1997, 52.7953) projected
  line L1 (-34.1997, 52.7953) -> (0, 52.7953) projected
  line L2 (-25.4, 43.815) -> (0, 43.815) projected
  line L3 (-38.1, 43.815) -> (-25.4, 43.815) projected
  line L4 (-38.1, 43.815) -> (-43.18, 43.815) projected
  line L5 (0, 0) -> (0, 52.7953) projected
  point P0 (88.9, 182.5)
extrude "Extrusion15" add sketch "Sketch15" against normal up to surface (2.54 mm away)
properties part number "Ystartnew"
